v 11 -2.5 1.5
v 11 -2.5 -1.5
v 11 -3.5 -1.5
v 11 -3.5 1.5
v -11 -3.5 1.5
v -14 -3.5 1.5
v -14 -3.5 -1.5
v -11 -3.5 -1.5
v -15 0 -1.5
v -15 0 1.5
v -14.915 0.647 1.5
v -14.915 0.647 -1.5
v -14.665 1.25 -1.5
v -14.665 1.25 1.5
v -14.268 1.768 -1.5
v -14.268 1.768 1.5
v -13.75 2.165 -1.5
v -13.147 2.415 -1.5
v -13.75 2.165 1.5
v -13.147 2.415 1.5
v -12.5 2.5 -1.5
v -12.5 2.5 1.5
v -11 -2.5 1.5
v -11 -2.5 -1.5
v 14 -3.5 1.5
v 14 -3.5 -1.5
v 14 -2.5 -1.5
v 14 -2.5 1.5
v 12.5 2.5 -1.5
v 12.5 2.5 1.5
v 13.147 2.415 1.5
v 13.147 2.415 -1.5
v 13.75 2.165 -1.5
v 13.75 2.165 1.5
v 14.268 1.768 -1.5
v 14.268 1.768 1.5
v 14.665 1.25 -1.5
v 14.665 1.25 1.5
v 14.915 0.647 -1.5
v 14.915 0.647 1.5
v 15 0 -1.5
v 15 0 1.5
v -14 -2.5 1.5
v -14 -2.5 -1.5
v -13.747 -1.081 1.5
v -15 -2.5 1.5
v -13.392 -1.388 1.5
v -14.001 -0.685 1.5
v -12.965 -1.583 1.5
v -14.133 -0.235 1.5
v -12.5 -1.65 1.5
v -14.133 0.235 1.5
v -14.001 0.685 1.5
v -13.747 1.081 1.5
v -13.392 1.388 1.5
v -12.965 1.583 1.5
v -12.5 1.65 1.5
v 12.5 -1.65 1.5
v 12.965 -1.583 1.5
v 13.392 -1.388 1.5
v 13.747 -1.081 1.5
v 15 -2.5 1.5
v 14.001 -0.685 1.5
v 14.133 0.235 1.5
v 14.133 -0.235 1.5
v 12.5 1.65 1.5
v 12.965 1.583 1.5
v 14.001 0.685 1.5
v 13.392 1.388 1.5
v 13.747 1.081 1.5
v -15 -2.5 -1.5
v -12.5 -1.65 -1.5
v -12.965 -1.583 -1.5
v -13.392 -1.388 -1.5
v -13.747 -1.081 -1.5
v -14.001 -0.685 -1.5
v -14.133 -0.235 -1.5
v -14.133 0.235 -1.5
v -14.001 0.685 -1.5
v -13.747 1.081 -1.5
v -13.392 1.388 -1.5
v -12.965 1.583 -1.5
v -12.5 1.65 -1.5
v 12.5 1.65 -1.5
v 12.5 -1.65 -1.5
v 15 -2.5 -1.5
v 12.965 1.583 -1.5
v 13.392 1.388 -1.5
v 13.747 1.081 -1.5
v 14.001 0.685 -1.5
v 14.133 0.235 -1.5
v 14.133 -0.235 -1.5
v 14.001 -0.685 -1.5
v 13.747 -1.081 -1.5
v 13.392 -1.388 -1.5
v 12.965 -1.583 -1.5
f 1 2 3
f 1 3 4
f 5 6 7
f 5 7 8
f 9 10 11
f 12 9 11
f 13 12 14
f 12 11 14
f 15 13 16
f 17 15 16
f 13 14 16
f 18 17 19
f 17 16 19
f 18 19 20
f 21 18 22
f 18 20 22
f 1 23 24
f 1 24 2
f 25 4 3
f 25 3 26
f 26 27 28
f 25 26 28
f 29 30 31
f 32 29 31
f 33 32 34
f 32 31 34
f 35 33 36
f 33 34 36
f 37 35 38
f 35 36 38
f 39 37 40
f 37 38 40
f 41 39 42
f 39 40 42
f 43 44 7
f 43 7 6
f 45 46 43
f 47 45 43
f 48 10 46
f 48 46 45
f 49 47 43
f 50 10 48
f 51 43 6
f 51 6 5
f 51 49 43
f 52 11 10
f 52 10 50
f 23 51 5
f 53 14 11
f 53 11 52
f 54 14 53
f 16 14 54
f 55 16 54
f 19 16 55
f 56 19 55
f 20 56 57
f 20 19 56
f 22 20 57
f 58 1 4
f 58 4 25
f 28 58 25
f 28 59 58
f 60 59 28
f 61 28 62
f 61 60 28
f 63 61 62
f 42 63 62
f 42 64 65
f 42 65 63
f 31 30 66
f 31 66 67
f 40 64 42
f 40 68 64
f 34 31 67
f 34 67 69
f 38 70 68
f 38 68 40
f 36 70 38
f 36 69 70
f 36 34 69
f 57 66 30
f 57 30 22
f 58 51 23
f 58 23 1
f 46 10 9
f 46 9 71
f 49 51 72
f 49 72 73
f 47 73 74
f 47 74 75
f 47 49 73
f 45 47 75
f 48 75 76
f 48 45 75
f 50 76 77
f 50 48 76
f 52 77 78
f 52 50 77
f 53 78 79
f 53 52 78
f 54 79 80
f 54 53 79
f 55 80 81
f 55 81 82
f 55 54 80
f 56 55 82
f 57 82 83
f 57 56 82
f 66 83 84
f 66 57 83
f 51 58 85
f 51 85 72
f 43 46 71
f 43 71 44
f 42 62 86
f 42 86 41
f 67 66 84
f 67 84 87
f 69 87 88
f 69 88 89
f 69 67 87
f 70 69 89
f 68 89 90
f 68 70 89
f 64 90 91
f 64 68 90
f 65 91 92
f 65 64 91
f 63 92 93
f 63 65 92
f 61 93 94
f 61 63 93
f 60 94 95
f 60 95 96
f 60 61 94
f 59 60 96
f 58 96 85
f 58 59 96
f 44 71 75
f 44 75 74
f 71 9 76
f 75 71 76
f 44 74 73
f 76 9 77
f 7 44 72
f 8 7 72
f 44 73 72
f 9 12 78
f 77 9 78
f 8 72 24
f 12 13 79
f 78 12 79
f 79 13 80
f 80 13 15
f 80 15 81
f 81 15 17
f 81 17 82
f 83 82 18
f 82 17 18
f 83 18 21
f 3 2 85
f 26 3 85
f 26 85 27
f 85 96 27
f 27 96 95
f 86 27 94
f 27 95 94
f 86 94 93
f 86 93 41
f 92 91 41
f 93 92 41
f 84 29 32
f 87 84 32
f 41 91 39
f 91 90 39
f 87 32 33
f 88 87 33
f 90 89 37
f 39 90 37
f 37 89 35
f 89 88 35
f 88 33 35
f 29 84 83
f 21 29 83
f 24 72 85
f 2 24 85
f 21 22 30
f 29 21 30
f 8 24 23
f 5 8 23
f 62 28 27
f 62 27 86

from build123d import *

# Parameters (mm, degrees)
BOSS_EXTRUDE1_DEPTH = 1.5
BOSS_EXTRUDE2_DEPTH = 3
SKETCH3_W           = 3
SKETCH3_H           = 3
BOSS_EXTRUDE3_DEPTH = 1


with BuildPart() as part:
    # Sketch1 → Boss-Extrude1 (new body, symmetric)
    with BuildSketch(Plane.XY):
        with BuildLine():
            Line((-12.5, 2.5), (12.5, 2.5))
            ThreePointArc((12.5, 2.5), (15, 0), (12.5, -2.5))
            Line((12.5, -2.5), (-12.5, -2.5))
            ThreePointArc((-12.5, -2.5), (-15, 0), (-12.5, 2.5))
        make_face()
        with BuildLine():
            Line((-12.5, 1.65), (12.5, 1.65))
            ThreePointArc((12.5, 1.65), (14.15, 0), (12.5, -1.65))
            Line((12.5, -1.65), (-12.5, -1.65))
            ThreePointArc((-12.5, -1.65), (-14.15, 0), (-12.5, 1.65))
        make_face(mode=Mode.SUBTRACT)
    extrude(amount=BOSS_EXTRUDE1_DEPTH, both=True)

    # Sketch2 → Boss-Extrude2 (add)
    with BuildSketch(Plane.XY.offset(1.5)):
        with BuildLine():
            Line((-15, 0), (-15, -2.5))
            Line((-15, -2.5), (-12.5, -2.5))
            ThreePointArc((-12.5, -2.5), (-14.267766953, -1.767766953), (-15, 0))
        make_face()
        with BuildLine():
            Line((12.5, -2.5), (15, -2.5))
            Line((15, -2.5), (15, 0))
            ThreePointArc((15, 0), (14.267766953, -1.767766953), (12.5, -2.5))
        make_face()
    extrude(amount=-BOSS_EXTRUDE2_DEPTH)

    # Sketch3 → Boss-Extrude3 (add)
    with BuildSketch(Plane.XZ.offset(2.5)):
        with Locations((-12.5, 0)):
            Rectangle(SKETCH3_W, SKETCH3_H)
        with Locations((12.5, 0)):
            Rectangle(SKETCH3_W, SKETCH3_H)
    extrude(amount=BOSS_EXTRUDE3_DEPTH)


solid = part.part
